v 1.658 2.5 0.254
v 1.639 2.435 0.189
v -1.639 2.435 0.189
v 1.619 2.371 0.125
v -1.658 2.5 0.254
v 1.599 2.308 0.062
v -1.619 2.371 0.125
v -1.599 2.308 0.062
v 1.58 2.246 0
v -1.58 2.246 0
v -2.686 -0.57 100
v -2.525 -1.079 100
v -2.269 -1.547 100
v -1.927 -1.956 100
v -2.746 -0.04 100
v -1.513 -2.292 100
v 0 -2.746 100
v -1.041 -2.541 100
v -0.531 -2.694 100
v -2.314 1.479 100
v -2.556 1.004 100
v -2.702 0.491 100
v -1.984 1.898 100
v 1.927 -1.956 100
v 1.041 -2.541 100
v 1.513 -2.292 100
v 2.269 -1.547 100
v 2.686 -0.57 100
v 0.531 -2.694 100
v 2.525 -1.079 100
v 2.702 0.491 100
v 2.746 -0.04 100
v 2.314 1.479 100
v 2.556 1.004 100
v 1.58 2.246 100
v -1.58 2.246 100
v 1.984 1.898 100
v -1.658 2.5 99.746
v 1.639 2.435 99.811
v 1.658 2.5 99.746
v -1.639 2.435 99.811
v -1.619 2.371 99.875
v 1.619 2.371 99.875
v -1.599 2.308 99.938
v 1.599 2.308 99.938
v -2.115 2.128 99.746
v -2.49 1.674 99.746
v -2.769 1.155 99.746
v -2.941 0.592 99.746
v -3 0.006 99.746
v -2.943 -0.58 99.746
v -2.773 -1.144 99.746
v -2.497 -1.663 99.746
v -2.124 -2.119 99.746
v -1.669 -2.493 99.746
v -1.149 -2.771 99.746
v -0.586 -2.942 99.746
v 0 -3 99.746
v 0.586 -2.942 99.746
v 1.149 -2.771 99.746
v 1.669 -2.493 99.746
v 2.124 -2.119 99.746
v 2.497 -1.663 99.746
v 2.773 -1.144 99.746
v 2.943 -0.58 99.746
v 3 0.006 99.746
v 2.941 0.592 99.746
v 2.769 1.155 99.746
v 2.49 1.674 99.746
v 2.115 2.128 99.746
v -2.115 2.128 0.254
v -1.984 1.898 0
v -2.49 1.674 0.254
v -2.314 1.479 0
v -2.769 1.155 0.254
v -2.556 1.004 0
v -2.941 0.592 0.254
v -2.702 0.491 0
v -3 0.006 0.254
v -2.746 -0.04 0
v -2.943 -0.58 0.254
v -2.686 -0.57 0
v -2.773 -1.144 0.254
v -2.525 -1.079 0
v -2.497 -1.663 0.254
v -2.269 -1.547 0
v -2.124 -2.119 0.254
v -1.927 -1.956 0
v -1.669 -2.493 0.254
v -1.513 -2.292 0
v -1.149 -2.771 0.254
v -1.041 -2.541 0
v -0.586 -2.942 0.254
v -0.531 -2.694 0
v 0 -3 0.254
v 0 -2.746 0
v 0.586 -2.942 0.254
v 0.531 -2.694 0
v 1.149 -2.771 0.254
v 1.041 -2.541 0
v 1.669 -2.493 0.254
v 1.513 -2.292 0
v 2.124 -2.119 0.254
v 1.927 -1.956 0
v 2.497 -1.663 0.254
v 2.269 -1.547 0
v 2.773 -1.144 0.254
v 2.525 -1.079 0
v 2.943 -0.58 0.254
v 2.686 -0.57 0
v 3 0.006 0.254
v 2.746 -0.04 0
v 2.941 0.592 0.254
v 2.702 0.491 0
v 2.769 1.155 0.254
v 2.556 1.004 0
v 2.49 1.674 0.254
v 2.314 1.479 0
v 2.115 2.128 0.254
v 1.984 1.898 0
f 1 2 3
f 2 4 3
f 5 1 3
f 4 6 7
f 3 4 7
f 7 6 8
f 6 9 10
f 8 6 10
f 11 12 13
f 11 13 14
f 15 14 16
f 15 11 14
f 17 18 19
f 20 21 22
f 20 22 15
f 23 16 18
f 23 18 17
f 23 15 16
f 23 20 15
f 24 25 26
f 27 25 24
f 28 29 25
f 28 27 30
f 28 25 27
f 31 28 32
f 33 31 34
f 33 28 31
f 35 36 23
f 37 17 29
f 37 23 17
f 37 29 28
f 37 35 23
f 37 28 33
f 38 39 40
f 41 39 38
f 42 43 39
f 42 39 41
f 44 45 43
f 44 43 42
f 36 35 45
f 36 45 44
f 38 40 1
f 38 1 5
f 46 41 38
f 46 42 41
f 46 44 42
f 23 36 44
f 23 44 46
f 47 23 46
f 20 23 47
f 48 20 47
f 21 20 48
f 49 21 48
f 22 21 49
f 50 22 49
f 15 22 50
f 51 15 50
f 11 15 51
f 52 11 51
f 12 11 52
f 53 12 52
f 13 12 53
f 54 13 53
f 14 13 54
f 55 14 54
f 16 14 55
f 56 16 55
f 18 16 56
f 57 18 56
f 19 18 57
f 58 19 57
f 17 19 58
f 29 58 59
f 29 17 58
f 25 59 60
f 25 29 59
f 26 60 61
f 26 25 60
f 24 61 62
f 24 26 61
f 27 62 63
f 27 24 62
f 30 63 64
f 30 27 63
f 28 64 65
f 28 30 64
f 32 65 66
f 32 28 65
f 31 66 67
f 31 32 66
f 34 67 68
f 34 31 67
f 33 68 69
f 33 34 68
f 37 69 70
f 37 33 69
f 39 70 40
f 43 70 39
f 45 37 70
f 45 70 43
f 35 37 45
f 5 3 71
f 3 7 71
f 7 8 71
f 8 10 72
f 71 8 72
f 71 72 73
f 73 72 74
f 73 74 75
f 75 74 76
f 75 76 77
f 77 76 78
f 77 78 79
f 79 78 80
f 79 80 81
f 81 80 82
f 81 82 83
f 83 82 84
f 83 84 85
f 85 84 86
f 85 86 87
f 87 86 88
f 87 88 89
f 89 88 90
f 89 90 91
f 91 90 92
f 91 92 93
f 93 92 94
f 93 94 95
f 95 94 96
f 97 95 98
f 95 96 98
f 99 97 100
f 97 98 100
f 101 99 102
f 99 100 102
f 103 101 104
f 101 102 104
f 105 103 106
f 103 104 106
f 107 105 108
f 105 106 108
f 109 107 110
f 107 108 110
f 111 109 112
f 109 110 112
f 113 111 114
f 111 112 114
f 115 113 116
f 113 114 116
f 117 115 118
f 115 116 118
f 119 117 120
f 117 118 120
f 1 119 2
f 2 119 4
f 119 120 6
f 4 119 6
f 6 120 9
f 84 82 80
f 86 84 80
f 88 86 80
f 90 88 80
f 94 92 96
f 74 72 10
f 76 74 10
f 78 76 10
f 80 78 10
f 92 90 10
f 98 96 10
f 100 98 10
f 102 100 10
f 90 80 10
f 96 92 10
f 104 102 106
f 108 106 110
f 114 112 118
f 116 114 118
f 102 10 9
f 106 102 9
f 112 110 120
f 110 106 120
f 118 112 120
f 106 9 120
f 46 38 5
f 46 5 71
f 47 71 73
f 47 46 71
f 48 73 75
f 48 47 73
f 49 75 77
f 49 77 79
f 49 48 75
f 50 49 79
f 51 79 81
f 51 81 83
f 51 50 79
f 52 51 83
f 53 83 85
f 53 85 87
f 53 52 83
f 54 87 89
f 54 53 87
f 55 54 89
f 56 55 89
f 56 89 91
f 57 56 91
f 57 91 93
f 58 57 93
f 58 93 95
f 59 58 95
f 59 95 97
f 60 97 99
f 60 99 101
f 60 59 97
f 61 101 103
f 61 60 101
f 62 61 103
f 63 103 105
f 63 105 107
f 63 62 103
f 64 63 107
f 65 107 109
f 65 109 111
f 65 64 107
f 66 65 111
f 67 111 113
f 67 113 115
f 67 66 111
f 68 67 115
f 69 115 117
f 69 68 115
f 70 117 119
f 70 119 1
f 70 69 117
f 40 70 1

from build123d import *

# Parameters (mm, degrees)
BOSS_EXTRUDE1_DEPTH = 100
CHAMFER1_SIZE       = 0.254


with BuildPart() as part:
    # Sketch1 → Boss-Extrude1 (new body)
    with BuildSketch(Plane.XY.offset(100)):
        with BuildLine():
            Line((1.658312395, 2.5), (-1.658312395, 2.5))
            ThreePointArc((-1.658312395, 2.5), (0, -3), (1.658312395, 2.5))
        make_face()
    extrude(amount=-BOSS_EXTRUDE1_DEPTH)

    # Chamfer1
    chamfer1_edges = [part.edges().sort_by_distance(p)[0] for p in [
        (0, 2.5, 100),
        (0, -3, 100),
        (0, -3, 0),
        (0, 2.5, 0),
    ]]
    chamfer(chamfer1_edges, length=CHAMFER1_SIZE)


solid = part.part
